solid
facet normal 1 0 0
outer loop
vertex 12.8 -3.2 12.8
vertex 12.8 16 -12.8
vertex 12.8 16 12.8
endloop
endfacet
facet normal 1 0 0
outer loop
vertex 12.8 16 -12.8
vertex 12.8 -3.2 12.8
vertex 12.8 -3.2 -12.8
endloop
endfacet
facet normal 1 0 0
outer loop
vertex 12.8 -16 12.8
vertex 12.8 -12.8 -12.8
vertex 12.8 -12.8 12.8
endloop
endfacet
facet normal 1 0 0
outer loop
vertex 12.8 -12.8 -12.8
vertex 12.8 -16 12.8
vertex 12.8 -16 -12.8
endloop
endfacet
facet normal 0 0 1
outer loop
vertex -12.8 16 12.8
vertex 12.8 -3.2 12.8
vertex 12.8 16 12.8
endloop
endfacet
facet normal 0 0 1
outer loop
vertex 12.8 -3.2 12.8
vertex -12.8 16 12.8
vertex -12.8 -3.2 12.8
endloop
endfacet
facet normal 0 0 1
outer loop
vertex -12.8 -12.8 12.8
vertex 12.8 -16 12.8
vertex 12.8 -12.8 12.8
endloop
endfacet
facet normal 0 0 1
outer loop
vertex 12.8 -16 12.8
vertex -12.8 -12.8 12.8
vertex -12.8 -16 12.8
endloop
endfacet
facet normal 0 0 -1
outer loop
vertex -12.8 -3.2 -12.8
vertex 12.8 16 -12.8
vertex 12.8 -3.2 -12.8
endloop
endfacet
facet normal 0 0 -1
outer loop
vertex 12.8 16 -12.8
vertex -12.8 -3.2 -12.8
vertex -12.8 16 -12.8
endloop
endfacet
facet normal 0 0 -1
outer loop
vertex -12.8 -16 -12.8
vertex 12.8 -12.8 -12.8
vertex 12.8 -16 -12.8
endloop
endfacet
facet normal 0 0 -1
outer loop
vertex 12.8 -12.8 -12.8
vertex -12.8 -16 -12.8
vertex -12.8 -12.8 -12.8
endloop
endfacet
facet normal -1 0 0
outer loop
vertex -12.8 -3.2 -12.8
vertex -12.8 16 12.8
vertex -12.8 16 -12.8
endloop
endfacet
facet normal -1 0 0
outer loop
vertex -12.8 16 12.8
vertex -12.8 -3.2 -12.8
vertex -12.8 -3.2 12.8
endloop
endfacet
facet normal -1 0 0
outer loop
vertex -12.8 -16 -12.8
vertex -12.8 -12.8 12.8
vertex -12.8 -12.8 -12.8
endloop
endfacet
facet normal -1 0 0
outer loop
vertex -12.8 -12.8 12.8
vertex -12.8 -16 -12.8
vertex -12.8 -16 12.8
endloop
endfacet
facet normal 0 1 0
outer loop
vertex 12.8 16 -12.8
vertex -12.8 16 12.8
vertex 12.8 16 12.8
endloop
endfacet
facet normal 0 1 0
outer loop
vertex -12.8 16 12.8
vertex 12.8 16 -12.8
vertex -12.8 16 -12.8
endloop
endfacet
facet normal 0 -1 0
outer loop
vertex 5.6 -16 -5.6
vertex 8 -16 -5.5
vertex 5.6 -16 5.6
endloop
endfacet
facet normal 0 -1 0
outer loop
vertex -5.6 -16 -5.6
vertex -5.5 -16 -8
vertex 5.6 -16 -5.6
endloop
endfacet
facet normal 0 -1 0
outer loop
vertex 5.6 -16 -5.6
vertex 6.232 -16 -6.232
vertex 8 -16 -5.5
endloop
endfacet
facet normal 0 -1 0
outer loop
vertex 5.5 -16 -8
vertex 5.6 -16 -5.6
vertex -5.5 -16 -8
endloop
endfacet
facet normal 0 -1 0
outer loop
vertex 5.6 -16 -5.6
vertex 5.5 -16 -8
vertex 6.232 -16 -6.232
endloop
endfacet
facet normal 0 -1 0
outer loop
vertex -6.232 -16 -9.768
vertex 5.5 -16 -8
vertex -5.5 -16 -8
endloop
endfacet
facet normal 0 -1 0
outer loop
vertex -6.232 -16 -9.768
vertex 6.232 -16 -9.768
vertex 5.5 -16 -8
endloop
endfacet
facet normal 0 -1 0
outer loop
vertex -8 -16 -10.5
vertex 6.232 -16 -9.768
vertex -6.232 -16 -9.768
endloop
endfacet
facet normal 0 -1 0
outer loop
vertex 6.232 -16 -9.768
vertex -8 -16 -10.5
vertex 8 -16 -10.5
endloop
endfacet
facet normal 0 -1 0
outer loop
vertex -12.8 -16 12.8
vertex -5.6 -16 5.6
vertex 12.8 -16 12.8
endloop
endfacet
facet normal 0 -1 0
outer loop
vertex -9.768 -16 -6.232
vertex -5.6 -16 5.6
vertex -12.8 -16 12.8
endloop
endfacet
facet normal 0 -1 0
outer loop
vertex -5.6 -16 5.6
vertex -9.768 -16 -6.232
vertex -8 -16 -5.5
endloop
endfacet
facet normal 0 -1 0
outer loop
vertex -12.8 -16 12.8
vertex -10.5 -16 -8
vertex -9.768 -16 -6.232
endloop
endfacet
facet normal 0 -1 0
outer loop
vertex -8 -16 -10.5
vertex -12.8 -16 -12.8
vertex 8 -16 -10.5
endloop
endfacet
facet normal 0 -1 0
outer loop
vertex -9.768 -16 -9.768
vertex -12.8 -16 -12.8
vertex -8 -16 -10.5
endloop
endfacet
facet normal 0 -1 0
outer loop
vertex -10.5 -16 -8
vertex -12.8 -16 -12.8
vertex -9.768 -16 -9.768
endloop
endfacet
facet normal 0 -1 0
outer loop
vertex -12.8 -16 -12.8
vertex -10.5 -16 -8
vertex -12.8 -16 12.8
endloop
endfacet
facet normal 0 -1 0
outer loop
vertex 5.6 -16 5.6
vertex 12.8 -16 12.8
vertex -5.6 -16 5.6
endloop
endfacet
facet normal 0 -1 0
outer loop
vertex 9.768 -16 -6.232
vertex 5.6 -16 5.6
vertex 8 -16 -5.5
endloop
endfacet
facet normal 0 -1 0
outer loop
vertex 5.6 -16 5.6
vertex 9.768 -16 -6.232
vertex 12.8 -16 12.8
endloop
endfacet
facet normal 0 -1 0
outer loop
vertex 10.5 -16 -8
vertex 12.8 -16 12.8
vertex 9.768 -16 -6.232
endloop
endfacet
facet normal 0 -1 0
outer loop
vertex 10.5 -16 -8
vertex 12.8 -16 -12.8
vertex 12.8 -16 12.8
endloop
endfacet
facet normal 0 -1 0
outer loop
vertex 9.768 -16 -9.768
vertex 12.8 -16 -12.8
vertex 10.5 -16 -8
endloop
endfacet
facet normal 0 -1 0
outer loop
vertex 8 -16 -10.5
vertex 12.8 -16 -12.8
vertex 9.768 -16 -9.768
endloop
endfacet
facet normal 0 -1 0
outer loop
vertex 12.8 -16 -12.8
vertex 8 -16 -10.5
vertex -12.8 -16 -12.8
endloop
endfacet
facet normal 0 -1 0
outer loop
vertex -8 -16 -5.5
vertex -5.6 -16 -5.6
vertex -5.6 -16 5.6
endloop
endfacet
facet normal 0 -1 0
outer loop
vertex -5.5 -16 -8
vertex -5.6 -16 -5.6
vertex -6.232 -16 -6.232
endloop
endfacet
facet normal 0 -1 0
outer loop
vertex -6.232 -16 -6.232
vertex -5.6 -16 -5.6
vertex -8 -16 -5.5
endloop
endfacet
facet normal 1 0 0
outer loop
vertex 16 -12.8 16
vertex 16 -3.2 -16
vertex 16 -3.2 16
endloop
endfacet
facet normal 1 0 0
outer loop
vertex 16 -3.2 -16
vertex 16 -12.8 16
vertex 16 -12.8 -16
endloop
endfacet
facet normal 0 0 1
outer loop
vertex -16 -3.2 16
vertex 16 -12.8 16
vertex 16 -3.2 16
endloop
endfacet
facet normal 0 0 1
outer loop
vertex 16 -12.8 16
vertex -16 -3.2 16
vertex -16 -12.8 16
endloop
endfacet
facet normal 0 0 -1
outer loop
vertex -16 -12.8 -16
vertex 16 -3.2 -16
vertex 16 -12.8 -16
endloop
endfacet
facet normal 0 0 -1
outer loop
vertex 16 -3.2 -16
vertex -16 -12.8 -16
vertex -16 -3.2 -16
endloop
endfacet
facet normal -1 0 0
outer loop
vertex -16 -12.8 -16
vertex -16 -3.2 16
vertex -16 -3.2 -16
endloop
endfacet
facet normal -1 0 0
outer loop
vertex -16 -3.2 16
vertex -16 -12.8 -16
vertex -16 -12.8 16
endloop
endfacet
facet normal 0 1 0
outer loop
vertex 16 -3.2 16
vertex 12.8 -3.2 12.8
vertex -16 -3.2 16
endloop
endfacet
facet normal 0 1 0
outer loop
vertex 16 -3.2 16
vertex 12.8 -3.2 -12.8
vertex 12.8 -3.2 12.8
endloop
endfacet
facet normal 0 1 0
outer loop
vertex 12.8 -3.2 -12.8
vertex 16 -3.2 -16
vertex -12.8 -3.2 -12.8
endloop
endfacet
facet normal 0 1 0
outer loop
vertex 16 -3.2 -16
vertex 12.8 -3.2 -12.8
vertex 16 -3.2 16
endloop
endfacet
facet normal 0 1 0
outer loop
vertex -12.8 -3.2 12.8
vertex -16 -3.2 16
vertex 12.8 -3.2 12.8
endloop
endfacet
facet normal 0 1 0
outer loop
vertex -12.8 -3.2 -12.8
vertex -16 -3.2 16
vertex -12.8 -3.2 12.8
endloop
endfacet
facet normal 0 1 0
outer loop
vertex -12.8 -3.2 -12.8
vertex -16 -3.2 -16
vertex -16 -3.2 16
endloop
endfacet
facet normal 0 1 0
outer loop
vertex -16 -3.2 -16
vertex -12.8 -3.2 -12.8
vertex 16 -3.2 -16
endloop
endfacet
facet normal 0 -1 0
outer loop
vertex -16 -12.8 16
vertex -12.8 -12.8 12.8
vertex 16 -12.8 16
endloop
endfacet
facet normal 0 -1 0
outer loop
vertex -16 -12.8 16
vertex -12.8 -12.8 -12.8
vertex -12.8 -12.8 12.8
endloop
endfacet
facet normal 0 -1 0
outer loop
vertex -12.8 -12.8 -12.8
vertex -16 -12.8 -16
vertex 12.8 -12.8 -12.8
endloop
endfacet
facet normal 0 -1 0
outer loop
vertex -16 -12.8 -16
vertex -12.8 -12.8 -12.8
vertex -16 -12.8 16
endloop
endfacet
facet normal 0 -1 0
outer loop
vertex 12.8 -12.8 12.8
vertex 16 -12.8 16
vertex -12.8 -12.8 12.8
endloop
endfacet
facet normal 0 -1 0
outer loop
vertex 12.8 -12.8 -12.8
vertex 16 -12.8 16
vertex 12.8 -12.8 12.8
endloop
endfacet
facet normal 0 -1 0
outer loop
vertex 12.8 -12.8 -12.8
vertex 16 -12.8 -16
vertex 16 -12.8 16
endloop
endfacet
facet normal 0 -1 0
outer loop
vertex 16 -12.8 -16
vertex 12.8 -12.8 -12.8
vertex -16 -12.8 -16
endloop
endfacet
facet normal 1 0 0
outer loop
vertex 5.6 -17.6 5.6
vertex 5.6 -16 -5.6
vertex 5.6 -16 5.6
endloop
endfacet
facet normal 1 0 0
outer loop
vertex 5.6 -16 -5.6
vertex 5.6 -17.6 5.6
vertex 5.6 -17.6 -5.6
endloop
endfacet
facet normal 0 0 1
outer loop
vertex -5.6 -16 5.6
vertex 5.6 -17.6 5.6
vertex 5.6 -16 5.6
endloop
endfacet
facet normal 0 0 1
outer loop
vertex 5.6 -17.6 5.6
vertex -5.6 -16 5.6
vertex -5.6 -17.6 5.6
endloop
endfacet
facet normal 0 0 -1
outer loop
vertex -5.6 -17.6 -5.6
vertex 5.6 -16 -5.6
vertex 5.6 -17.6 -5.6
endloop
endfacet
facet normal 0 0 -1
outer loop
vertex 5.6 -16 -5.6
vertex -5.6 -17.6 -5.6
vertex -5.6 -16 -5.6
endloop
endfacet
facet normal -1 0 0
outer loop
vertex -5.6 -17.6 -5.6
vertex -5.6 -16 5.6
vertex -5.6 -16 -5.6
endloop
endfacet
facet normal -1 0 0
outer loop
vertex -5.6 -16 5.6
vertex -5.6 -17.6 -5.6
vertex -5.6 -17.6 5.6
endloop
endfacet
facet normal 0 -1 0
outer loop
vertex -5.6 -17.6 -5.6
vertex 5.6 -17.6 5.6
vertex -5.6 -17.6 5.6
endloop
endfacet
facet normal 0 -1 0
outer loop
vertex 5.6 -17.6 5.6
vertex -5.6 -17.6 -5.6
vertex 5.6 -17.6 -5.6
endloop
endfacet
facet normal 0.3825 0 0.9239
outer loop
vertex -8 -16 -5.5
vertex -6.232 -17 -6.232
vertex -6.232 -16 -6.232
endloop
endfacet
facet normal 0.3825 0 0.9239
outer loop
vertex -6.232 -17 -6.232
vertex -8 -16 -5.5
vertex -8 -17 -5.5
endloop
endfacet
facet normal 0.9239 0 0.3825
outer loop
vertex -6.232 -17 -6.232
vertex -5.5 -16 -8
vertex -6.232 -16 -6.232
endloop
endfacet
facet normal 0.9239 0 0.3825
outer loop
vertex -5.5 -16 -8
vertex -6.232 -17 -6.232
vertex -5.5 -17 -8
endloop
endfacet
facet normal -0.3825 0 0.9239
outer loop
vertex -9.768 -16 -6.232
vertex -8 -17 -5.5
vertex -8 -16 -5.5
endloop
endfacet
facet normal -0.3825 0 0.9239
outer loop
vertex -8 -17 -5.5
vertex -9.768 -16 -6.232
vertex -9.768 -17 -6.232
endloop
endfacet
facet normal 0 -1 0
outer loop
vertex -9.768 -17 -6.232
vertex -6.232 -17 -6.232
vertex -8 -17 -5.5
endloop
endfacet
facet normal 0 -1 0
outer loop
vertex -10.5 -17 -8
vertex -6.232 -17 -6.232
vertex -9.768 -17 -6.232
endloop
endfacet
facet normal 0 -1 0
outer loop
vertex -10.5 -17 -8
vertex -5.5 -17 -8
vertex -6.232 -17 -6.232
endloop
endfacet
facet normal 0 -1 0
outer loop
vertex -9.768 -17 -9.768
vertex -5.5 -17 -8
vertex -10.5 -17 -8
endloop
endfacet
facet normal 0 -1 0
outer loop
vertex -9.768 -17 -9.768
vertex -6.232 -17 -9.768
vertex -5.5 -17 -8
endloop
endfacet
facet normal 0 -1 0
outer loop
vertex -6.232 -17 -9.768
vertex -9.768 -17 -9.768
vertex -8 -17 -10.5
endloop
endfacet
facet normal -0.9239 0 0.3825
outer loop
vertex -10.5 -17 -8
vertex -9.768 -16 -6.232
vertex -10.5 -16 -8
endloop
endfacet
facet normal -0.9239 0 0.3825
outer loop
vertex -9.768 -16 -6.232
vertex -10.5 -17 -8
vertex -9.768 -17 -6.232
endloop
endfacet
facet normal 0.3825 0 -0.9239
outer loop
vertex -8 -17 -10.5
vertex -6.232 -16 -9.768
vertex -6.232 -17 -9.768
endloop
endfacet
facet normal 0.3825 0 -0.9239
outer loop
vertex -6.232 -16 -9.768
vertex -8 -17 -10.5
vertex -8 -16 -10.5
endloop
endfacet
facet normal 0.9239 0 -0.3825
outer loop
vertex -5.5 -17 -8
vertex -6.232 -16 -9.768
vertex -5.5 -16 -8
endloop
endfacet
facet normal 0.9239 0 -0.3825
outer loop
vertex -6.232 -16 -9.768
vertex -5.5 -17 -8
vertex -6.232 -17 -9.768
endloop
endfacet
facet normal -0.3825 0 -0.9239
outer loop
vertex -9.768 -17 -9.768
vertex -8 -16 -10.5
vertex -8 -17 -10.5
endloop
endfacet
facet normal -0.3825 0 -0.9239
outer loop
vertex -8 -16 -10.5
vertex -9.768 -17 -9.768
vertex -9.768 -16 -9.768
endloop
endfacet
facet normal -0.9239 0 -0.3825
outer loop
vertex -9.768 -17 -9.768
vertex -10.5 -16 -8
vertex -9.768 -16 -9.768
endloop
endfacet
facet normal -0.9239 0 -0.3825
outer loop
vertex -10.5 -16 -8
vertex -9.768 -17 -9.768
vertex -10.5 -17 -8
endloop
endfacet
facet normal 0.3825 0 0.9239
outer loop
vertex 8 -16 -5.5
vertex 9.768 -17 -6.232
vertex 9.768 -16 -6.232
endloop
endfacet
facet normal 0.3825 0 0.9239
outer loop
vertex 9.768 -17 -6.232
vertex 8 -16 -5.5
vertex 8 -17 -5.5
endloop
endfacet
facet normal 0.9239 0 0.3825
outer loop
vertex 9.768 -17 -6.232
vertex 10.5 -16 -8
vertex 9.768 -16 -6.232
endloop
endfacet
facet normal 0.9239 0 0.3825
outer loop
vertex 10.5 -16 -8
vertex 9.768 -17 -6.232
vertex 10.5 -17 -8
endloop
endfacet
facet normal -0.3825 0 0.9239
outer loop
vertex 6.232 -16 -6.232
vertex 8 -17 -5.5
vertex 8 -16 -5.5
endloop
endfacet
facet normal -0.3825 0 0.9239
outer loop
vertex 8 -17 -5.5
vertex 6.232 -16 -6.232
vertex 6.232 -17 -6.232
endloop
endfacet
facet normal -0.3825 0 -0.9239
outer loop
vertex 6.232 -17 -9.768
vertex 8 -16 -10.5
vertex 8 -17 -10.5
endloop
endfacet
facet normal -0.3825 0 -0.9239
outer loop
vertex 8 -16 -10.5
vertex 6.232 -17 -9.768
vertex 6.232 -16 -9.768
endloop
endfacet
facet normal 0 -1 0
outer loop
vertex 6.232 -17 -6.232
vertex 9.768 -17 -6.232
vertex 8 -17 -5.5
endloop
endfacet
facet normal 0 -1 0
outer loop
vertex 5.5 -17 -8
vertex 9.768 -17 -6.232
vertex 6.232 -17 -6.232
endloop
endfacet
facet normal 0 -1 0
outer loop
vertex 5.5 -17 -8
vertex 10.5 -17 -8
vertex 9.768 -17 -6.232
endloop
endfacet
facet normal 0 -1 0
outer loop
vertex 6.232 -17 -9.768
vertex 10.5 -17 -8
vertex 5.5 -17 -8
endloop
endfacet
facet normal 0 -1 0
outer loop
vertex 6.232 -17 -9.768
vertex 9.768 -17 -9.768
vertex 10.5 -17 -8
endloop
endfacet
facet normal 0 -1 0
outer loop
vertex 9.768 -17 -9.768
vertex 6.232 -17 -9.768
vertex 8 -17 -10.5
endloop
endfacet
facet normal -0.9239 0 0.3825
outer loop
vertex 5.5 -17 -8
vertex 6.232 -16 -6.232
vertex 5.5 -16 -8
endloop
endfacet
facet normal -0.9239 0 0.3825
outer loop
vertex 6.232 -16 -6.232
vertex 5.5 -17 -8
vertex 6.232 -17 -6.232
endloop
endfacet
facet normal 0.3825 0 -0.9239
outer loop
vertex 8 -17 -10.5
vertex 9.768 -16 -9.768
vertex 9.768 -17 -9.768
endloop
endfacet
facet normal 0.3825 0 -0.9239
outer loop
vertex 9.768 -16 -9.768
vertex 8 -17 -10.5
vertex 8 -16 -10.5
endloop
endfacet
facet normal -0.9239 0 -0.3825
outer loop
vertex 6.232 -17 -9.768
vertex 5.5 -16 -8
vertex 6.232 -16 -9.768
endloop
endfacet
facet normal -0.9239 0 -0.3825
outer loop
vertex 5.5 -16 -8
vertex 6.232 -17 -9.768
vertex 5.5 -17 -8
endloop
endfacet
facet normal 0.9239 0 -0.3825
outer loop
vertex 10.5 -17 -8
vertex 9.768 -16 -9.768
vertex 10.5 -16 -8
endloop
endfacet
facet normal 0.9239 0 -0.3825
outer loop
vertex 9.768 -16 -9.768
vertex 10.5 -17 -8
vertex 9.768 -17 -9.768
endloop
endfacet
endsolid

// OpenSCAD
size = 32;//block=32 //item=8



//cube([size*0.8,size*0.8,size*0.8],center=true);

cube([size * 0.8, size * 1, size * 0.8], center = true);
translate([0, -size * 0.25, 0]) {//ring
  cube([size * 1, size * 0.3, size * 1], center = true);
}
;//translate
translate([0, -size * 0.5, 0]) {//pistonKnub
  cube([size * 0.35, size * 0.1, size * 0.35], center = true);

}
;//translate
translate([-size * 0.25, -size * 0.5, -size * 0.25]) {//tubePortLeft
  //cube([size*0.25,size*0.1,size*0.25],center=true);
  rotate([90, 0, 0]) {
    cylinder(d = 5);
  }
  ;//rotate
}
;//translate

translate([size * 0.25, -size * 0.5, -size * 0.25]) {//tubePortRight
  //cube([size*0.25,size*0.1,size*0.25],center=true);
  rotate([90, 0, 0]) {
    cylinder(d = 5);
  }
  ;//rotate
}
;//translate
difference() {

  union() {

  }
  ;//union

}
;//difference
